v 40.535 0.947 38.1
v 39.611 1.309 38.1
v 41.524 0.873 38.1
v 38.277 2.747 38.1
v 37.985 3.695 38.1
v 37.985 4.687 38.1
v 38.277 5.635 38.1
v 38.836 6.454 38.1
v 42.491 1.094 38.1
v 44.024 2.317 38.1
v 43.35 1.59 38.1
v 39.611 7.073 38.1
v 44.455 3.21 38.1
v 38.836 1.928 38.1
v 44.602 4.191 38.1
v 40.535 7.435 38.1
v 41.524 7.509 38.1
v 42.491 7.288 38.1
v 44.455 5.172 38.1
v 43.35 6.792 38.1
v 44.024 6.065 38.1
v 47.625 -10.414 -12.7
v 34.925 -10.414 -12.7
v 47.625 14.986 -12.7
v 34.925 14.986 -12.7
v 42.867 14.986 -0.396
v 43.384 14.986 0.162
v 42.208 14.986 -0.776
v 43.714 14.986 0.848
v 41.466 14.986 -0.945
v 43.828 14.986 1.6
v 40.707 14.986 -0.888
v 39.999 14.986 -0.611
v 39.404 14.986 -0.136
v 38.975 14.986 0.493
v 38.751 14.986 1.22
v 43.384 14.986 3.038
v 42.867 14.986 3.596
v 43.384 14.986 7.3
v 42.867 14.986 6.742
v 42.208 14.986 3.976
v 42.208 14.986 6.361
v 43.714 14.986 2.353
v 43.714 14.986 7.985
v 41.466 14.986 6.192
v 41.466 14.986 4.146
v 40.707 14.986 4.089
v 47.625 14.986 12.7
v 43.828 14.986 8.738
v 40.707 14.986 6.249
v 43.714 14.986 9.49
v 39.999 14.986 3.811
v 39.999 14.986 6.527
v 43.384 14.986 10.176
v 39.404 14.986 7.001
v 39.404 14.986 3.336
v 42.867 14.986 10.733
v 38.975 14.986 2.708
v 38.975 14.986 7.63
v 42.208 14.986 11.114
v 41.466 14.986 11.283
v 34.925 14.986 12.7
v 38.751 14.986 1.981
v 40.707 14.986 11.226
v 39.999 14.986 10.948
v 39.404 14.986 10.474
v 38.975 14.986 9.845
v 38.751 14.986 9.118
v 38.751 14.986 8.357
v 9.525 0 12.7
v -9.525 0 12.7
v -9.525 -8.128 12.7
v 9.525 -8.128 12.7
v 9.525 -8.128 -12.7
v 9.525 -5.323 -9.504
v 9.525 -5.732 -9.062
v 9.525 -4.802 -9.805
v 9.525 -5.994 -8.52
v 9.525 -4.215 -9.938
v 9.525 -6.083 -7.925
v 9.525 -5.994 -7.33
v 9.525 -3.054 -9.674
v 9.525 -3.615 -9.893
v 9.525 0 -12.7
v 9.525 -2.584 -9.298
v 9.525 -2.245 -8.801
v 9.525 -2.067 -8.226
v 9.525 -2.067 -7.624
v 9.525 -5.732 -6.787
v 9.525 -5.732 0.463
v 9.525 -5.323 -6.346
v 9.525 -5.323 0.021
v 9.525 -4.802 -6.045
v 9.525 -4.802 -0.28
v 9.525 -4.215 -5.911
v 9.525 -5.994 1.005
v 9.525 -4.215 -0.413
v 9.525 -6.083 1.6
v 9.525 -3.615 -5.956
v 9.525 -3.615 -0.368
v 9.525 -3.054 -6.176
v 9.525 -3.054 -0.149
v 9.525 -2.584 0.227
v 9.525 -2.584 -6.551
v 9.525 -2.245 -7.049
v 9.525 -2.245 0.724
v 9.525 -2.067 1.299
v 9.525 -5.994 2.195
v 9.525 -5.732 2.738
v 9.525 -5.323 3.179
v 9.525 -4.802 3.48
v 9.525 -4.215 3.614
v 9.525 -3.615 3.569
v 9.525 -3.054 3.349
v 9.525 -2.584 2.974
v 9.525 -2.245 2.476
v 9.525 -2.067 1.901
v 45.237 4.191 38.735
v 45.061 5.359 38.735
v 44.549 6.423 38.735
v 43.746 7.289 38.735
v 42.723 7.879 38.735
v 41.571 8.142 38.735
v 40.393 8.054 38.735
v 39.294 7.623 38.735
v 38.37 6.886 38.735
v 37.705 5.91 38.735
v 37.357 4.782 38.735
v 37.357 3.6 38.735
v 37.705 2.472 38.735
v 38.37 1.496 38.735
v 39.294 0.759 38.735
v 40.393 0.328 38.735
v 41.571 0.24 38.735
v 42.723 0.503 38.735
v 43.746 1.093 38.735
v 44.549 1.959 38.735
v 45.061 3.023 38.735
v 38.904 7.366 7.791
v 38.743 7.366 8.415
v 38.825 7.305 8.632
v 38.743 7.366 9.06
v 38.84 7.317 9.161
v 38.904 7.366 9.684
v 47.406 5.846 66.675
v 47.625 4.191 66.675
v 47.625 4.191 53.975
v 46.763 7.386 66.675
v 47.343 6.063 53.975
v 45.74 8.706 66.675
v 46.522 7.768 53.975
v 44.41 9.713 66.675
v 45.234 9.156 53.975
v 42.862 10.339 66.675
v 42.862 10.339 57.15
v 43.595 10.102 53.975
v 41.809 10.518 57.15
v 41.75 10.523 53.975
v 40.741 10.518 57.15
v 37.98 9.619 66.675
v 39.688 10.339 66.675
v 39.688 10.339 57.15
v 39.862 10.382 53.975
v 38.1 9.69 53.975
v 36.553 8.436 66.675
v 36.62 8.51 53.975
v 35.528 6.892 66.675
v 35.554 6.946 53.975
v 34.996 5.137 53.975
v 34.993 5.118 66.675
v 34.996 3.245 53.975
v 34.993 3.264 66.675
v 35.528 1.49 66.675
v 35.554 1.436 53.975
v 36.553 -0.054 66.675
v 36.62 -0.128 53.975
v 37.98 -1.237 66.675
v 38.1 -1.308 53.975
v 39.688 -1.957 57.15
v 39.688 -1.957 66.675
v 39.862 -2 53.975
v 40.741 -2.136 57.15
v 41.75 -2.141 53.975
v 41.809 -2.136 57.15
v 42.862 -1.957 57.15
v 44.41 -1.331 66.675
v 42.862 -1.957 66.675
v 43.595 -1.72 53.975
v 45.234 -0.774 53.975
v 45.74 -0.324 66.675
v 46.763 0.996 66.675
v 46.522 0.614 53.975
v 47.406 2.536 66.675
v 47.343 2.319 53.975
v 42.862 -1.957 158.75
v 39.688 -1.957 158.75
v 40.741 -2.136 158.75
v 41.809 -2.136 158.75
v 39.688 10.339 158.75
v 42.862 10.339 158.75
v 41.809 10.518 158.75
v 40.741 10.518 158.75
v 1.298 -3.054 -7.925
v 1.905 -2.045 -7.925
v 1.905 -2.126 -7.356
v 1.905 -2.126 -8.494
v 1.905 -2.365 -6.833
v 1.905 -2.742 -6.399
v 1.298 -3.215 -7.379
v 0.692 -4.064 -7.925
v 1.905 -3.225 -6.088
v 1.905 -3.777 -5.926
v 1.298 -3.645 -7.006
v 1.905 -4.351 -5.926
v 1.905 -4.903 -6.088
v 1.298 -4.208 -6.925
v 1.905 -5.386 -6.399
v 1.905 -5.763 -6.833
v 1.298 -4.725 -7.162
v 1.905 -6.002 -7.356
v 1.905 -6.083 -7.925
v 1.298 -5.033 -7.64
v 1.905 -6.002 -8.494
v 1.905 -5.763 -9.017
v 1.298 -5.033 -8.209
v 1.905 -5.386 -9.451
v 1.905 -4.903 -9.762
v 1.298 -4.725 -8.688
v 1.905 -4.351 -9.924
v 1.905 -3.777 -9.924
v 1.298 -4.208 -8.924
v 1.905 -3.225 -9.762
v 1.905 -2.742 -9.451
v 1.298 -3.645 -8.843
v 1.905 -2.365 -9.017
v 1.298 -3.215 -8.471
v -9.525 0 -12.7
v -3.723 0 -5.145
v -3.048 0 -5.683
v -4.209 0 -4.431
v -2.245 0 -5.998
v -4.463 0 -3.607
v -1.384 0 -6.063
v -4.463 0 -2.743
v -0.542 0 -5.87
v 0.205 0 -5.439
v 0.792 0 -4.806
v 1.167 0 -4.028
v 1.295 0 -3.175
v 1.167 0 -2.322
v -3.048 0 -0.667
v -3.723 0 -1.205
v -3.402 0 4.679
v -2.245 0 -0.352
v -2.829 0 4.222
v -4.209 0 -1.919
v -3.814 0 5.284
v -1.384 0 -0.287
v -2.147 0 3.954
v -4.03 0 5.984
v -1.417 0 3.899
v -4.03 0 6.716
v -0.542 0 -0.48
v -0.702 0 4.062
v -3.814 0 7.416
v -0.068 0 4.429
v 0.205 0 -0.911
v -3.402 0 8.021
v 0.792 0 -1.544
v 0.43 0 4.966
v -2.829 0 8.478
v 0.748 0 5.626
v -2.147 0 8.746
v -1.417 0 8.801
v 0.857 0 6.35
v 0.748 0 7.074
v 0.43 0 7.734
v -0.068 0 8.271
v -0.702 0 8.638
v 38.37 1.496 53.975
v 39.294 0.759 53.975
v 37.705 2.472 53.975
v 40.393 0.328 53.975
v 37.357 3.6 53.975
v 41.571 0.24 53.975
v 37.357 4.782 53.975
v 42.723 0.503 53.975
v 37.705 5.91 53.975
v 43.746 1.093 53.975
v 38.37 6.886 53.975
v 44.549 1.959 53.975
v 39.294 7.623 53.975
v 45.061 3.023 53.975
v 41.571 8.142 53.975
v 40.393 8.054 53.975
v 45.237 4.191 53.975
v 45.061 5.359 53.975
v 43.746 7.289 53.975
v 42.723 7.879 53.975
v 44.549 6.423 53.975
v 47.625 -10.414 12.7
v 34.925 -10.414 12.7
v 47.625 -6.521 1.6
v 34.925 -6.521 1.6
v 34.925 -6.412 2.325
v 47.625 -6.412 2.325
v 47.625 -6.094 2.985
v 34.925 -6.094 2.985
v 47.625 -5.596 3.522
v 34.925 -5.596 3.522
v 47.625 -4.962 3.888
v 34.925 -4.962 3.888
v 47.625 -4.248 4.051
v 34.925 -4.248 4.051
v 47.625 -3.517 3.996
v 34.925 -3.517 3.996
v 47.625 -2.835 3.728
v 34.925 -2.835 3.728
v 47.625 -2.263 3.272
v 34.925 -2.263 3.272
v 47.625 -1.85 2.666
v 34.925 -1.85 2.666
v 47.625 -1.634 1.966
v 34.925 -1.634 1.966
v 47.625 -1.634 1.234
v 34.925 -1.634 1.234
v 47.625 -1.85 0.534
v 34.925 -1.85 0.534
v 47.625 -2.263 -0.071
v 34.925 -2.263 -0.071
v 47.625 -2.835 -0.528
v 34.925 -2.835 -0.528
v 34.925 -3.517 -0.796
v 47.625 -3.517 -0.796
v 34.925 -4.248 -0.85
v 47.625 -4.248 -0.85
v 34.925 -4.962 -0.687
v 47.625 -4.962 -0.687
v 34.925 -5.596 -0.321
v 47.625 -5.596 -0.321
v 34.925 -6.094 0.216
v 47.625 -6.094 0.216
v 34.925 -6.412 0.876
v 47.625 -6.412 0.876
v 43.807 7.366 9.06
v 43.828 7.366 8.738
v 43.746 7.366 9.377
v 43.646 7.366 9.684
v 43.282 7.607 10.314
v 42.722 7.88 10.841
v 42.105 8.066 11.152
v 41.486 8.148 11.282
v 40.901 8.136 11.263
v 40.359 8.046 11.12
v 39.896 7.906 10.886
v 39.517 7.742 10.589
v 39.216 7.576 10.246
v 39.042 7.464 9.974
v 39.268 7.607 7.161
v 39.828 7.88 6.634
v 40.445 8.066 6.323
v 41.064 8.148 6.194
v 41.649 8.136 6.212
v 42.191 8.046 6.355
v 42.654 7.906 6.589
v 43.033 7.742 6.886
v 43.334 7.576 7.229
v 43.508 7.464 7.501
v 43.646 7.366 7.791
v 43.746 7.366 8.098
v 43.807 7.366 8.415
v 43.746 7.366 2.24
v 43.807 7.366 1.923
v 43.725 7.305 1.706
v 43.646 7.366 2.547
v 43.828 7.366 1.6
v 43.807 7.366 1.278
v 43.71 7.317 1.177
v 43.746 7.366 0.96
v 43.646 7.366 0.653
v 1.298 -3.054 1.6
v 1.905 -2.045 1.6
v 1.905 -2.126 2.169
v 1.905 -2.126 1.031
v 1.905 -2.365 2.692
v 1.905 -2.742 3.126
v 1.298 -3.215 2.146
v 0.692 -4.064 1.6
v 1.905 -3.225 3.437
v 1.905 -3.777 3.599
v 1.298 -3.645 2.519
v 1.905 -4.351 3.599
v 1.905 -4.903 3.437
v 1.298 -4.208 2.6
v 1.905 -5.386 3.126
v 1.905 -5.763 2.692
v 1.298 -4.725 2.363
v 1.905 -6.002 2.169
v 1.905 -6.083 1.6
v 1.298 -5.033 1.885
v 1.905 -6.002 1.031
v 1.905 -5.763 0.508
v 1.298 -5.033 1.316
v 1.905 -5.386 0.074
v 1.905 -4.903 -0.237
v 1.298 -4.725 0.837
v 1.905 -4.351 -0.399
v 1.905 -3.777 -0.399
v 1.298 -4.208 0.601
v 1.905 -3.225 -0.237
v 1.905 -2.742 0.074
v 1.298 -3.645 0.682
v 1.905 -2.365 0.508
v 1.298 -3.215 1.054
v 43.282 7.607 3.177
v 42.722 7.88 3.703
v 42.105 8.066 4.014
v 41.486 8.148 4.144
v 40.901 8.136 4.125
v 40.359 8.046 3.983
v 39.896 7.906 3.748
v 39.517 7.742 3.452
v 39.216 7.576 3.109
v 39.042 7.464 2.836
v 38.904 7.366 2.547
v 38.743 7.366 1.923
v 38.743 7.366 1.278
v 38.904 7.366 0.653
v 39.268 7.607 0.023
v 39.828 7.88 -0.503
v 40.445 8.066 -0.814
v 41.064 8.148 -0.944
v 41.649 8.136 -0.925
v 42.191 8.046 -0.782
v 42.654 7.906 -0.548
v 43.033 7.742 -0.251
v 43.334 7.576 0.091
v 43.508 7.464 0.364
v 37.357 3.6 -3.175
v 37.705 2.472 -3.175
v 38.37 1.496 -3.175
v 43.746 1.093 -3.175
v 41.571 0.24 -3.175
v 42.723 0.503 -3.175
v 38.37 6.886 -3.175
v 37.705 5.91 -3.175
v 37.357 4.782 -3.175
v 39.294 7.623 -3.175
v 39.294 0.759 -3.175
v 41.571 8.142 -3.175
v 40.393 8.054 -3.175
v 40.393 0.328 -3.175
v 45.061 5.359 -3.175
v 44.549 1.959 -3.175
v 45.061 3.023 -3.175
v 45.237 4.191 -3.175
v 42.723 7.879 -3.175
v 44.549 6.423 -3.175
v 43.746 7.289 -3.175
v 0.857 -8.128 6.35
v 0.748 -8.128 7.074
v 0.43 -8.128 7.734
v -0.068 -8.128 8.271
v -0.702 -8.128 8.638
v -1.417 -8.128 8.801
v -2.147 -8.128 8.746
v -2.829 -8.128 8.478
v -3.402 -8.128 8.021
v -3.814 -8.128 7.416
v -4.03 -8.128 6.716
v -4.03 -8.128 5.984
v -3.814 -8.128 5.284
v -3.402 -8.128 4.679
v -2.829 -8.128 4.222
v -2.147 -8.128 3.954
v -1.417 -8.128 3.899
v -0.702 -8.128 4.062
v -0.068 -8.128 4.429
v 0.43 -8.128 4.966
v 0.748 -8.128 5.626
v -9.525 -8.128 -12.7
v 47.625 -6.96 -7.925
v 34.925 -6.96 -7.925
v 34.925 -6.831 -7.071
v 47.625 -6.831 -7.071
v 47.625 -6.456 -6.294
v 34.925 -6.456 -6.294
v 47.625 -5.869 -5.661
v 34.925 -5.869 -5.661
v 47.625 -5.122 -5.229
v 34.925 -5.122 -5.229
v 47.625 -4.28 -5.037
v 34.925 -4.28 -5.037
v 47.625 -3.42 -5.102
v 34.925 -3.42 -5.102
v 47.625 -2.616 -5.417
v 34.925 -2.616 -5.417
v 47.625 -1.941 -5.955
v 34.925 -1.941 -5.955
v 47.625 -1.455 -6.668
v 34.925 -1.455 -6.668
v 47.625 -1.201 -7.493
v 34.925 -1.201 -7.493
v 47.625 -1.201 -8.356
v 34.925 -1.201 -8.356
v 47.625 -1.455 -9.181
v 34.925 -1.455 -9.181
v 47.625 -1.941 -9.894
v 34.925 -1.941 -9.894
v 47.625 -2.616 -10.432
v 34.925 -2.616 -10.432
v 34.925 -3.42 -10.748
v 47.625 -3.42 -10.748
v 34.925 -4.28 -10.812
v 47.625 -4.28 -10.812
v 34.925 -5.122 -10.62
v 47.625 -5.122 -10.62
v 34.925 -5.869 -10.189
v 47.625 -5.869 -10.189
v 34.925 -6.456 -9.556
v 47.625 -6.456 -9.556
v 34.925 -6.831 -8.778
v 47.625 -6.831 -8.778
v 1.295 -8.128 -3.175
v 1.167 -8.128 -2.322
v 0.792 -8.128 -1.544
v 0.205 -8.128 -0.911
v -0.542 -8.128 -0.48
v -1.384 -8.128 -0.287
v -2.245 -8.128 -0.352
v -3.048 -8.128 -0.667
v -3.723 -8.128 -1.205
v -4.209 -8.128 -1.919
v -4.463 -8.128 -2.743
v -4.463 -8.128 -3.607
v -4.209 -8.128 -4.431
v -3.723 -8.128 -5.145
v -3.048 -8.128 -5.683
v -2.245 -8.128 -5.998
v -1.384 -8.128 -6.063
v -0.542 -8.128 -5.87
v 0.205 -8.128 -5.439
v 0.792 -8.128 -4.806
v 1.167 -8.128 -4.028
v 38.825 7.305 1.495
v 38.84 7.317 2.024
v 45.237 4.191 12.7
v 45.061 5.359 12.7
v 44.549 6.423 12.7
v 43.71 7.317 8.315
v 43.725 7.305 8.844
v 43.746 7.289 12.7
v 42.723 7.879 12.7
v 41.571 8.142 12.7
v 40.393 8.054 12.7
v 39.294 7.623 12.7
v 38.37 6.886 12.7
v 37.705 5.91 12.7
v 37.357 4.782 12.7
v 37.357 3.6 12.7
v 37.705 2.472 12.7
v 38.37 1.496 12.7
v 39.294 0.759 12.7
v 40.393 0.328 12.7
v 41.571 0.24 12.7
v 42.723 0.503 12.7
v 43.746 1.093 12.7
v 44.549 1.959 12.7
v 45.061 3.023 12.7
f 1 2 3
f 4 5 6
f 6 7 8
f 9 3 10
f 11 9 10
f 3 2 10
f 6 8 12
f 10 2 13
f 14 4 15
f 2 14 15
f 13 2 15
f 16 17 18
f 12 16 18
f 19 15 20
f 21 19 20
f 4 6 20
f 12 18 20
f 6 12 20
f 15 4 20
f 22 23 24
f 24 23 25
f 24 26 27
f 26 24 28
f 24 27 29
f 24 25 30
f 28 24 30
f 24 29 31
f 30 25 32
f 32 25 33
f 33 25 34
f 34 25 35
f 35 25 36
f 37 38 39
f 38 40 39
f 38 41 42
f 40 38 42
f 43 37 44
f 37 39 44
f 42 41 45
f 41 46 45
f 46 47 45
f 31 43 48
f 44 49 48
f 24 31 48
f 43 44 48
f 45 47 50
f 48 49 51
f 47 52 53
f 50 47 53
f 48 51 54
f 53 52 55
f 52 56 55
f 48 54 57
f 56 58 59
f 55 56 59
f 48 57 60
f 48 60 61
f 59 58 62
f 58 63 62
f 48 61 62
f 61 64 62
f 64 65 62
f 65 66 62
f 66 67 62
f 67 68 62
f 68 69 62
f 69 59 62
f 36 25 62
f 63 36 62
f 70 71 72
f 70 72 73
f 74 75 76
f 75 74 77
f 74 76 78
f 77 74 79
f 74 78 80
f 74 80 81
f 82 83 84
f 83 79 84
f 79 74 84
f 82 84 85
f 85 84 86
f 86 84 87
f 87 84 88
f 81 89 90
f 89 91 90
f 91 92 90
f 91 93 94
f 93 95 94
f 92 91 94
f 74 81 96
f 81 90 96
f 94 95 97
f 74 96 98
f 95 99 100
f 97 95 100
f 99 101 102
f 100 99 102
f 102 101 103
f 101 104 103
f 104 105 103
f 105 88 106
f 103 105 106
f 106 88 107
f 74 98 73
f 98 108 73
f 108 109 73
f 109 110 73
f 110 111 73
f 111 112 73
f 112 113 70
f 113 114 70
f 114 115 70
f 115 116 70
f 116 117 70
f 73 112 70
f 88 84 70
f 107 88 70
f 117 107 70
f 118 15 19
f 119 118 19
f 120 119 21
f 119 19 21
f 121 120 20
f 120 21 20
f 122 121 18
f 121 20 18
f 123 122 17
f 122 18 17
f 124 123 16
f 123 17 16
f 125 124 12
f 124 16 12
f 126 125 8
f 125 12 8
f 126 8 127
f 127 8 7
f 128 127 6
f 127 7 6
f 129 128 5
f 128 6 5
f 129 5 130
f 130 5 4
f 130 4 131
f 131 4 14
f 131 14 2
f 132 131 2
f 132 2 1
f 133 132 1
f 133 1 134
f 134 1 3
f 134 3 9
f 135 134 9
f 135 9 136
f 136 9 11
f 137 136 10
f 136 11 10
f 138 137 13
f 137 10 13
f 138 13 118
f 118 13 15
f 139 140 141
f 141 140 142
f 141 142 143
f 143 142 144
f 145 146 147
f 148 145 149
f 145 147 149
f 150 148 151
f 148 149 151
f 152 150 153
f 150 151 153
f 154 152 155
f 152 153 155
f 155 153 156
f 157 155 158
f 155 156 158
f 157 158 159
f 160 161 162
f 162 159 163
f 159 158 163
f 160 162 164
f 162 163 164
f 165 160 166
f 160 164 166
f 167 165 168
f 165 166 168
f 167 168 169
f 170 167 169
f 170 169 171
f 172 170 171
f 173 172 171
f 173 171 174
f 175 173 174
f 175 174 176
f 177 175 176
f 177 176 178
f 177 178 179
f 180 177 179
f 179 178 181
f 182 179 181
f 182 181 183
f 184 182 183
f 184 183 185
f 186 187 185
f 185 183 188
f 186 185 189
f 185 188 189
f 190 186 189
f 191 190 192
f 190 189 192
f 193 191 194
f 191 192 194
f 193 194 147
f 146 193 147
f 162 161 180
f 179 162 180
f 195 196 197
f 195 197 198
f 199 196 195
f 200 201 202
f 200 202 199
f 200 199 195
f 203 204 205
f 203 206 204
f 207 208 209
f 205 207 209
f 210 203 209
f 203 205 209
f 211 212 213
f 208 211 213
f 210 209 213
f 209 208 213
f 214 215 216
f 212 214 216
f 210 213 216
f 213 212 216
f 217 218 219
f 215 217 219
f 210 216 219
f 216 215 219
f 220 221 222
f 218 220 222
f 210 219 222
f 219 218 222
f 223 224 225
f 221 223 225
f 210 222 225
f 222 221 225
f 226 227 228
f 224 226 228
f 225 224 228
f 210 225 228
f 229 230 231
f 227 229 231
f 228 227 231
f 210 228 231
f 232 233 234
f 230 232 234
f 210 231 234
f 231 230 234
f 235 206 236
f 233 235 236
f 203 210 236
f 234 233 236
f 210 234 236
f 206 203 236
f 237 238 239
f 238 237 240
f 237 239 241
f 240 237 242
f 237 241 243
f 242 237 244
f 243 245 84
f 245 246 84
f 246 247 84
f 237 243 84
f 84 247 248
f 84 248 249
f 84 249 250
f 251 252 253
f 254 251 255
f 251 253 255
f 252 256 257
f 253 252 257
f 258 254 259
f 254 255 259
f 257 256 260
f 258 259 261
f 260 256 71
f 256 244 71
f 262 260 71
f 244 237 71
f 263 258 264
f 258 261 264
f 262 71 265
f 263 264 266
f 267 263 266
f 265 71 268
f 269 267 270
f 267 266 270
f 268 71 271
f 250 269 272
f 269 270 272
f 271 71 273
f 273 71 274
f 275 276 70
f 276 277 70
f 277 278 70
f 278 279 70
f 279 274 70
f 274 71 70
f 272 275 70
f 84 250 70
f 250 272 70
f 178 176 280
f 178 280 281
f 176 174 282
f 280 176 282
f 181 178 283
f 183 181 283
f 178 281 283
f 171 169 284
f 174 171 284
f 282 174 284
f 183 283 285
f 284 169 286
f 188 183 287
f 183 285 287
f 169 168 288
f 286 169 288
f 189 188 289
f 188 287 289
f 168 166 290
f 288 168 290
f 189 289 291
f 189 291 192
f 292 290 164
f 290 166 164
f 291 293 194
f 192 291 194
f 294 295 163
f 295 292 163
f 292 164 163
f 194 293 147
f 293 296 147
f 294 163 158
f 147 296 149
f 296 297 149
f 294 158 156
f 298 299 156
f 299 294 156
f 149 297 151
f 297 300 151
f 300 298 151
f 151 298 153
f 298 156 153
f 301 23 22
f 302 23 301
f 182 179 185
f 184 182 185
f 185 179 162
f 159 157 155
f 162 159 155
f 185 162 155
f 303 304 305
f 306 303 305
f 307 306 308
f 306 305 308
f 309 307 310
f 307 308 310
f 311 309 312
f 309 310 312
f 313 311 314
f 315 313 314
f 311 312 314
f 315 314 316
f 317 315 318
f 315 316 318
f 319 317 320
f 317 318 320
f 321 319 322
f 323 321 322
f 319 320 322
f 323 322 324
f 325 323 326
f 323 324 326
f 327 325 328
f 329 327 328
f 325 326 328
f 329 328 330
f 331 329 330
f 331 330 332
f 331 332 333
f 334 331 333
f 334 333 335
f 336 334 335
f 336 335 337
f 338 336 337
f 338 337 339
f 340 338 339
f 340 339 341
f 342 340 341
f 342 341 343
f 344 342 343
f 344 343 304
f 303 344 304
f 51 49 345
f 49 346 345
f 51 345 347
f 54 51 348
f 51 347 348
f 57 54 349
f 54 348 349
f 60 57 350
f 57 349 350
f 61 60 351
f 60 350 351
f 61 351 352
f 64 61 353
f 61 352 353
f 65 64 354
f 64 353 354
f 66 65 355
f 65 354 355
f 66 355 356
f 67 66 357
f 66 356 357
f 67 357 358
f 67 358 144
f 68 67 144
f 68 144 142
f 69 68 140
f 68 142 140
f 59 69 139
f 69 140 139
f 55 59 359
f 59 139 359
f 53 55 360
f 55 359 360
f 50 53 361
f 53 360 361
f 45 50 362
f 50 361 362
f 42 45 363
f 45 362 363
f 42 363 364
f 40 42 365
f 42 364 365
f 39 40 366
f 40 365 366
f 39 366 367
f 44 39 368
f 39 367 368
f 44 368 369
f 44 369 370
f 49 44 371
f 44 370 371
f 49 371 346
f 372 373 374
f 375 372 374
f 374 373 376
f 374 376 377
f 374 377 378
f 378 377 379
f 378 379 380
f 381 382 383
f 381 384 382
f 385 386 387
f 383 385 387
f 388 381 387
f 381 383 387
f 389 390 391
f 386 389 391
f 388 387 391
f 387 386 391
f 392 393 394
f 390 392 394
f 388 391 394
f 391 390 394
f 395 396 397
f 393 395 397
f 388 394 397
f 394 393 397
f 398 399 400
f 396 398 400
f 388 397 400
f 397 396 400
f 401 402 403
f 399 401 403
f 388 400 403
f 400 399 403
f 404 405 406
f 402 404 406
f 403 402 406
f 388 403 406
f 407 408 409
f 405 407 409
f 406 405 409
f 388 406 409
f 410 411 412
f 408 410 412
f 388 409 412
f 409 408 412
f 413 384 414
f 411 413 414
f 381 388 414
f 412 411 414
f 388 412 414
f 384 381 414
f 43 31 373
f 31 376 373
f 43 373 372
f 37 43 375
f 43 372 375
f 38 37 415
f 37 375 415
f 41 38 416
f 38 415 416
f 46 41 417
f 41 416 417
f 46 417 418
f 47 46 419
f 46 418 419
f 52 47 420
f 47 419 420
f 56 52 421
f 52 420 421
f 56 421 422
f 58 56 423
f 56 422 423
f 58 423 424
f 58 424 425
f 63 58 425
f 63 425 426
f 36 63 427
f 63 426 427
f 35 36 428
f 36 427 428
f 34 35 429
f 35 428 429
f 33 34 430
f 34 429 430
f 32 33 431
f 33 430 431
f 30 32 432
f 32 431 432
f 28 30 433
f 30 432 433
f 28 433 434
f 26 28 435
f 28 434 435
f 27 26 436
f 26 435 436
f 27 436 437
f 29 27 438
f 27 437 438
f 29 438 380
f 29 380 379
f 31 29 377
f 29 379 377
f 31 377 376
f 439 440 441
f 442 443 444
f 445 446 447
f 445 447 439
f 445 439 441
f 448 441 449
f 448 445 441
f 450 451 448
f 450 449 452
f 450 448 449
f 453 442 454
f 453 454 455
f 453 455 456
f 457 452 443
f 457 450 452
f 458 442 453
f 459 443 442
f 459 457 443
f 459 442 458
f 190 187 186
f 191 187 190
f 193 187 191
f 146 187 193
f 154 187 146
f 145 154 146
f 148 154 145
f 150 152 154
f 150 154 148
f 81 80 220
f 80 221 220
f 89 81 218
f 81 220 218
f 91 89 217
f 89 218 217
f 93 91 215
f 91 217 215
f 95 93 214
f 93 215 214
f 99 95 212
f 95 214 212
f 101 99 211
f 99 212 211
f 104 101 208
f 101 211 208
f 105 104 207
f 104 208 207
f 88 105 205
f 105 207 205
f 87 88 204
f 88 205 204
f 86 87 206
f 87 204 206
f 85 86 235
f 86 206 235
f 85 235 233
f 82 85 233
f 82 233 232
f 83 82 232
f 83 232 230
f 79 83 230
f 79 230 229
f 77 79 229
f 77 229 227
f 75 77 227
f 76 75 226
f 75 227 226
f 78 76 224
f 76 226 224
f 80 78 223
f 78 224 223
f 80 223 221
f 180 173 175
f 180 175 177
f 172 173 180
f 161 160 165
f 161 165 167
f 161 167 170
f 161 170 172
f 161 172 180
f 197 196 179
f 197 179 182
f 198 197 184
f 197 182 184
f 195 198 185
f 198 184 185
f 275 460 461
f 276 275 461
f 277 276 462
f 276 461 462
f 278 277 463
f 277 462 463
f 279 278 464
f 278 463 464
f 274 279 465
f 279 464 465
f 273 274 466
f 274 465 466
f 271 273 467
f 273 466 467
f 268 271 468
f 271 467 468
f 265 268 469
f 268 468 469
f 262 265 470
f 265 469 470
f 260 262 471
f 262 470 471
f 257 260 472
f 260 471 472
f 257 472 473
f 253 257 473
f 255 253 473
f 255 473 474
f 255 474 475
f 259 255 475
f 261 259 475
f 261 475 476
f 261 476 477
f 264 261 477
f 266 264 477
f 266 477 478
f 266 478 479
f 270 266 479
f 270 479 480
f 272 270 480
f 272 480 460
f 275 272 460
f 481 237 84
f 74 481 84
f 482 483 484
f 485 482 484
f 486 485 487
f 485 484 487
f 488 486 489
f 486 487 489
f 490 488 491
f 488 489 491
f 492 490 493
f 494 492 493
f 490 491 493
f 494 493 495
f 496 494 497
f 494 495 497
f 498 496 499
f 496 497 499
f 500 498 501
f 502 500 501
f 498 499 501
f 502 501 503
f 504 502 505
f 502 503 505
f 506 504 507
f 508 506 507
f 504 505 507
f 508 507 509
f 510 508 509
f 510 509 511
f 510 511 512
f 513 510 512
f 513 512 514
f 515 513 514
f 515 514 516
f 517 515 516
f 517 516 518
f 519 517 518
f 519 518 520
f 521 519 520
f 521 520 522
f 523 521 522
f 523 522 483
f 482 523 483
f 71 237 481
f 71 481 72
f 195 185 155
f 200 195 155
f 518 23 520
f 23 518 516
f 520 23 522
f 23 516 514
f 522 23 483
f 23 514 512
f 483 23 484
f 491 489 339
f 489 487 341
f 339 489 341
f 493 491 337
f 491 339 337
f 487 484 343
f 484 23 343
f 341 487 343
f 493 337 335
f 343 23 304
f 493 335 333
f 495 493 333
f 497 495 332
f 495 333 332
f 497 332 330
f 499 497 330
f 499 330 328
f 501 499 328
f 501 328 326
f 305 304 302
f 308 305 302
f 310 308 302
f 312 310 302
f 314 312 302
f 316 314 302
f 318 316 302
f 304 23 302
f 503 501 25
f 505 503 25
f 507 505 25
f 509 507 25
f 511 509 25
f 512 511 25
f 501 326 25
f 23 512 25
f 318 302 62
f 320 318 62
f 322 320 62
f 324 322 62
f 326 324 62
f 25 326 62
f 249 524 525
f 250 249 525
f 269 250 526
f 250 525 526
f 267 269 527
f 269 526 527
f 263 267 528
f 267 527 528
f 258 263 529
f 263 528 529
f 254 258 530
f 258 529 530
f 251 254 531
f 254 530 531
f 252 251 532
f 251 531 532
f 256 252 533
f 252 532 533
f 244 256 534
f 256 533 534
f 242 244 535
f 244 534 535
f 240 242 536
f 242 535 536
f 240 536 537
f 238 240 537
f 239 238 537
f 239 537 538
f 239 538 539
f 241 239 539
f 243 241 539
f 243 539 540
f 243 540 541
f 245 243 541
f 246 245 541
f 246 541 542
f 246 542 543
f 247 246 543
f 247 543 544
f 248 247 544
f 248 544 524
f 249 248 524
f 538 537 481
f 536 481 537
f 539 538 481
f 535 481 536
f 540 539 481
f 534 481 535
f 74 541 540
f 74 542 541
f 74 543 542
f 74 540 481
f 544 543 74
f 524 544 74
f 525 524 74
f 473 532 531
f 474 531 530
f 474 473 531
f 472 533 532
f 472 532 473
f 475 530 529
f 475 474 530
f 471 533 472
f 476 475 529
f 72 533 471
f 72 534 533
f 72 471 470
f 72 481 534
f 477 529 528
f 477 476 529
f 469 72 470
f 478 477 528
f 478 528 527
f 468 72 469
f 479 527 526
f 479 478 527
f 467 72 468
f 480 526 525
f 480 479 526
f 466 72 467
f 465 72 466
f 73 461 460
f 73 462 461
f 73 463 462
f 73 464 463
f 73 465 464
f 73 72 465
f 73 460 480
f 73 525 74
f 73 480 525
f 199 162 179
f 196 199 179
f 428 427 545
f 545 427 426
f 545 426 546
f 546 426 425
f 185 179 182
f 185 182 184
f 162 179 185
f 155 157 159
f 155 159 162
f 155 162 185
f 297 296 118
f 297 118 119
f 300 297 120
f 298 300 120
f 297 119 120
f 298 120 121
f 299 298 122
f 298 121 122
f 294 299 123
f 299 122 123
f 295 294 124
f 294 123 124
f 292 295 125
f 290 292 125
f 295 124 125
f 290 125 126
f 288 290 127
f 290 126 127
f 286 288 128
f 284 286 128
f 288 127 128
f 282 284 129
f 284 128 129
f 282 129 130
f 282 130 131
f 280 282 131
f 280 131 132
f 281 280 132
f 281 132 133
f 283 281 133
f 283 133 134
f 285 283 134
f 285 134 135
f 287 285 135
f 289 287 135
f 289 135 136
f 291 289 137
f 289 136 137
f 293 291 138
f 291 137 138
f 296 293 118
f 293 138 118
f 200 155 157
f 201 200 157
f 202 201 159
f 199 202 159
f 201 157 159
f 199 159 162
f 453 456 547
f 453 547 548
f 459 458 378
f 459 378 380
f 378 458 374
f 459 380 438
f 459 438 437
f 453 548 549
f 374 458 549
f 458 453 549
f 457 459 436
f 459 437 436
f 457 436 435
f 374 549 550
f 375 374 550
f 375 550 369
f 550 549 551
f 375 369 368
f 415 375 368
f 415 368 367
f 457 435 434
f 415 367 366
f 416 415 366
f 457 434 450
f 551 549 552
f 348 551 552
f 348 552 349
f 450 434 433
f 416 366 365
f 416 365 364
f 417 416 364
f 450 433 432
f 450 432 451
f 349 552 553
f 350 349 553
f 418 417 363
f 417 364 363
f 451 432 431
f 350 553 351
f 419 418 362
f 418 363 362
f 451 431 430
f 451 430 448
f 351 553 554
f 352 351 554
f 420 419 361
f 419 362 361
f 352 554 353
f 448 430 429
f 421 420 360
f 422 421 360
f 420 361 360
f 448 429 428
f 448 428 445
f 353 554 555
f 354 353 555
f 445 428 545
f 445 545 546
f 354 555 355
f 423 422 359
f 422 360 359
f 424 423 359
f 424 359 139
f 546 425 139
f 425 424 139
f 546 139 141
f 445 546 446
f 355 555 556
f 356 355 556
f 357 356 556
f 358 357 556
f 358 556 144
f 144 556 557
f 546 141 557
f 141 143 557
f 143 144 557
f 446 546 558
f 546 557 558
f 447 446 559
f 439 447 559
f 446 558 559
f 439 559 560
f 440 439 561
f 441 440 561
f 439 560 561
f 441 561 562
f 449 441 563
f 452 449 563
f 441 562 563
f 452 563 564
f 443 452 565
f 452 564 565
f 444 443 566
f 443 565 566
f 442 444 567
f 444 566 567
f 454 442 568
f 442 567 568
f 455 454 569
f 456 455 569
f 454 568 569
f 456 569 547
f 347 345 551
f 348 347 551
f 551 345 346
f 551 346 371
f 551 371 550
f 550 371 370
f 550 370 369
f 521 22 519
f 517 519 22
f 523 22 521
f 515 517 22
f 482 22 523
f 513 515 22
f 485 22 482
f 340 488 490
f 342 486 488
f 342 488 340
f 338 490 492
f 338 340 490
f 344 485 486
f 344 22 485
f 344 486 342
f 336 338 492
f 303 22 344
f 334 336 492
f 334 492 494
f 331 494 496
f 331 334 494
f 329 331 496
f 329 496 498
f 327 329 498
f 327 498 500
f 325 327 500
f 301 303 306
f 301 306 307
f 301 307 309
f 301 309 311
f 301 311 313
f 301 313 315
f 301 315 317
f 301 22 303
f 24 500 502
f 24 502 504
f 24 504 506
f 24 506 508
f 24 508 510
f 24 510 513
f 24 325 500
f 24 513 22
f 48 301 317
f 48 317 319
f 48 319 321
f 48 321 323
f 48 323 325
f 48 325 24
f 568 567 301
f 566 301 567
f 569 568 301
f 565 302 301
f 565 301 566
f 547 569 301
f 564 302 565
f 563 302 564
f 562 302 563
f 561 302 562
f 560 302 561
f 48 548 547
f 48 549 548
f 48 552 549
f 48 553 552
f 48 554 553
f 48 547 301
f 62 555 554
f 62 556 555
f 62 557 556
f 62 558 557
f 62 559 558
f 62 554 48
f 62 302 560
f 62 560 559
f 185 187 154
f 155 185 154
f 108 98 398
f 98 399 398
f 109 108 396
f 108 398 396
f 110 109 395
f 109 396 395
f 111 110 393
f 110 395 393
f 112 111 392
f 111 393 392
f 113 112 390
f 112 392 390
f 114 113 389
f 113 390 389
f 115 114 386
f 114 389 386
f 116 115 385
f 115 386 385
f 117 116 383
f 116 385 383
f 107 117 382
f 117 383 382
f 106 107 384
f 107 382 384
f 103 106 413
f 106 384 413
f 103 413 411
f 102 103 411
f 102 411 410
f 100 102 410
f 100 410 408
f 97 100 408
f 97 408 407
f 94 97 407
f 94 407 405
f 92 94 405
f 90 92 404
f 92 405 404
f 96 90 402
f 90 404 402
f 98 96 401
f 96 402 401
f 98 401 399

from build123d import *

# Parameters (mm, degrees)
F0_W      = 19.05
F0_H      = 25.4
F1_DEPTH  = 8.128
F3_D      = 4.9149
F4_D      = 5.7912
F6_D      = 4.0386
F6_DEPTH  = 7.62
F6_TIP    = 1.213317848
F8_W      = 25.4
F8_H      = 25.4
F9_DEPTH  = 12.7
F11_D     = 4.9149
F12_D     = 5.7912
F13_R     = 3.9624
F14_DEPTH = 15.875
F16_D     = 5.1054
F16_DEPTH = 7.62
F16_TIP   = 1.5338169022
F18_R     = 3.9624
F19_DEPTH = 15.875
F20_R     = 6.35
F20_R_2   = 3.9624
F21_DEPTH = 12.7
F23_DEPTH = 9.525
F24_DEPTH = 101.6
F25_SIZE  = 0.635


with BuildPart() as f1:
    # F0 (on Front) → F1 (new body)
    with BuildSketch(Plane.XZ):
        Rectangle(F0_W, F0_H)
    extrude(amount=F1_DEPTH)

    # F3 (through all)
    with Locations(Plane(origin=(0, 0, 0), x_dir=(-1, 0, 0), z_dir=(0, 1, 0))):
        with Locations((1.6002, 6.35)):
            Hole(F3_D / 2)

    # F4 (through all)
    with Locations(Plane(origin=(0, 0, 0), x_dir=(-1, 0, 0), z_dir=(0, 1, 0))):
        with Locations((1.6002, -3.175)):
            Hole(F4_D / 2)

    # F6
    with Locations(Plane.YZ.offset(9.525)):
        with Locations((-4.064, 1.6002), (-4.064, -7.9248)):
            Hole(F6_D / 2, depth=F6_DEPTH)
            with Locations((0, 0, -(F6_DEPTH + F6_TIP / 2))):  # 118° drill point
                Cone(0, F6_D / 2, F6_TIP, mode=Mode.SUBTRACT)


with BuildPart() as f9:
    # F8 (on offset) → F9 (new body)
    with BuildSketch(Plane.YZ.offset(34.925)):
        with Locations((2.286, 0)):
            Rectangle(F8_W, F8_H)
    extrude(amount=F9_DEPTH)

    # F11 (through all)
    with Locations(Plane.YZ.offset(47.625)):
        with Locations((-4.064, 1.6002)):
            Hole(F11_D / 2)

    # F12 (through all)
    with Locations(Plane.YZ.offset(47.625)):
        with Locations((-4.064, -7.9248)):
            Hole(F12_D / 2)

    # F13 (on face) → F14 (cut)
    with BuildSketch(Plane.XY.offset(12.7)):
        with Locations((41.275, 4.191)):
            Circle(F13_R)
    extrude(amount=-F14_DEPTH, mode=Mode.SUBTRACT)

    # F16
    with Locations(Plane(origin=(0, 14.986, 0), x_dir=(-1, 0, 0), z_dir=(0, 1, 0))):
        with Locations((-41.275, 8.7376), (-41.275, 1.6002)):
            Hole(F16_D / 2, depth=F16_DEPTH)
            with Locations((0, 0, -(F16_DEPTH + F16_TIP / 2))):  # 118° drill point
                Cone(0, F16_D / 2, F16_TIP, mode=Mode.SUBTRACT)


with BuildPart() as f19:
    # F18 (on offset) → F19 (new body)
    with BuildSketch(Plane.XY.offset(38.1)):
        with Locations((41.275, 4.191)):
            Circle(F18_R)
    extrude(amount=F19_DEPTH)

    # F20 (on face) → F21 (join)
    with BuildSketch(Plane.XY.offset(53.975)):
        with Locations((41.275, 4.191)):
            Circle(F20_R)
        with Locations((41.275, 4.191)):
            Circle(F20_R_2, mode=Mode.SUBTRACT)
        with Locations((41.275, 4.191)):
            Circle(F20_R_2)
    extrude(amount=F21_DEPTH)

    # F22 (on face) → F23 (cut)
    with BuildSketch(Plane.XY.offset(66.675)):
        with BuildLine():
            Line((42.8625, -1.9573610621), (42.8625, 10.3393610621))
            ThreePointArc((42.8625, 10.3393610621), (41.275, 10.541), (39.6875, 10.3393610621))
            Line((39.6875, 10.3393610621), (39.6875, -1.9573610621))
            ThreePointArc((39.6875, -1.9573610621), (41.275, -2.159), (42.8625, -1.9573610621))
        make_face()
    extrude(amount=-F23_DEPTH, mode=Mode.SUBTRACT)


with BuildPart() as f24:
    # F24 (new): a face of the model
    f24_faces = [f19.part.faces().sort_by_distance(p)[0] for p in [
        (41.275, 4.191, 57.15),
    ]]
    extrude(f24_faces, amount=F24_DEPTH)


with BuildPart() as f19_1:
    add(f19.part)

    # F25
    f25_edges = [f19_1.edges().sort_by_distance(p)[0] for p in [
        (37.3126, 4.191, 38.1),
    ]]
    chamfer(f25_edges, length=F25_SIZE)


solid = Compound([f1.part, f9.part, f24.part, f19_1.part])
